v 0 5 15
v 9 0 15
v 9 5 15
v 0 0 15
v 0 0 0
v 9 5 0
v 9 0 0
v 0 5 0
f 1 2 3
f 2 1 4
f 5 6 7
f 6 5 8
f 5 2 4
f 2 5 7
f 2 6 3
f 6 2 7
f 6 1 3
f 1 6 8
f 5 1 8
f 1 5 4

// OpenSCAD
// Generated by SolidPython 1.0.1 on 2020-07-29 00:46:55


cube(size = [9, 5, 15]);
/***********************************************
*********      SolidPython code:      **********
************************************************
 
# import packages: SolidPython
from solid import *
from solid.utils import *
from itertools import chain, combinations, permutations


class Resize:

    def __init__(self, scad_file):
        self.scad_file = scad_file
        #self.scad_file = import_scad(scad_file)
        # cone/cylinder param:
        self.r1 = 0
        self.r2 = 0
        self.h = 0
        # rectangular prism param:
        self.w = 0
        self.l = 0
        # ellipse param:
        self.r = 0

    # import OpenScad code (file name corresponds to shape)


    # classify shape + parameters
    def assign(self, param1, param2, param3):
        if self.scad_file == 'cone.scad':
            self.r1 = param1
            self.r2 = param2
            self.h = param3
        elif self.scad_file == 'cylinder.scad':
            self.r1 = param1
            self.r2 = param2
            self.h = param3
        elif self.scad_file == 'rectangularPrism.scad':
            self.h = param1
            self.l = param2
            self.w = param3
        else:
            self.r = param1
            self.h = param2

    # resize parameters
    def iterate(self):
        x = range(3, 20, 2)
        i = 1
        if self.scad_file == 'cone.scad':
            tempList = list(permutations(x, 2))
            for temp in tempList:
                param1 = temp[0]
                param2 = temp[1]
                filepath = 'produced_scad_files/' + 'cone' + str(param1) + '_' + str(param2) + '_' + '.scad'
                scad_render_to_file(cylinder(h=param1, r1=param2, r2=0), filepath)

        elif self.scad_file == 'cylinder.scad':
            tempList = list(permutations(x, 3))
            for temp in tempList:
                param1 = temp[0]
                param2 = temp[1]
                filepath = 'produced_scad_files/' + 'cylinder' + str(param1) + '_' + str(param2) + '_' + '.scad'
                scad_render_to_file(cylinder(h=param1, r1=param2, r2=param2), filepath)

        elif self.scad_file == 'rectangularPrism.scad':
            tempList = list(permutations(x, 3))
            for temp in tempList:
                param1 = temp[0]
                param2 = temp[1]
                param3 = temp[2]
                filepath = 'produced_scad_files/' + 'rectangularPrism' + str(param1) + '_' + str(param2) + '_' + str(
                    param3) + '.scad'
                scad_render_to_file(cube(size=(param1, param2, param3)), filepath)

        elif self.scad_file == 'ellipse.scad':
            tempList = list(permutations(x, 4))
            for temp in tempList:
                param1 = temp[0]
                param2 = temp[1]
                param3 = temp[2]
                param4 = temp[3]
                filepath = 'produced_scad_files/' + 'ellipse' + str(param1) + '_' + str(param2) + '_' + str(param3) + '_' + str(param4) + '.scad'
                scad_render_to_file(scale([param1, param2, param3])(sphere(r=param4)), filepath)

    def render_to_scadfile(self):
        scad_render_to_file(scad, 'example.scad') 
 
************************************************/
